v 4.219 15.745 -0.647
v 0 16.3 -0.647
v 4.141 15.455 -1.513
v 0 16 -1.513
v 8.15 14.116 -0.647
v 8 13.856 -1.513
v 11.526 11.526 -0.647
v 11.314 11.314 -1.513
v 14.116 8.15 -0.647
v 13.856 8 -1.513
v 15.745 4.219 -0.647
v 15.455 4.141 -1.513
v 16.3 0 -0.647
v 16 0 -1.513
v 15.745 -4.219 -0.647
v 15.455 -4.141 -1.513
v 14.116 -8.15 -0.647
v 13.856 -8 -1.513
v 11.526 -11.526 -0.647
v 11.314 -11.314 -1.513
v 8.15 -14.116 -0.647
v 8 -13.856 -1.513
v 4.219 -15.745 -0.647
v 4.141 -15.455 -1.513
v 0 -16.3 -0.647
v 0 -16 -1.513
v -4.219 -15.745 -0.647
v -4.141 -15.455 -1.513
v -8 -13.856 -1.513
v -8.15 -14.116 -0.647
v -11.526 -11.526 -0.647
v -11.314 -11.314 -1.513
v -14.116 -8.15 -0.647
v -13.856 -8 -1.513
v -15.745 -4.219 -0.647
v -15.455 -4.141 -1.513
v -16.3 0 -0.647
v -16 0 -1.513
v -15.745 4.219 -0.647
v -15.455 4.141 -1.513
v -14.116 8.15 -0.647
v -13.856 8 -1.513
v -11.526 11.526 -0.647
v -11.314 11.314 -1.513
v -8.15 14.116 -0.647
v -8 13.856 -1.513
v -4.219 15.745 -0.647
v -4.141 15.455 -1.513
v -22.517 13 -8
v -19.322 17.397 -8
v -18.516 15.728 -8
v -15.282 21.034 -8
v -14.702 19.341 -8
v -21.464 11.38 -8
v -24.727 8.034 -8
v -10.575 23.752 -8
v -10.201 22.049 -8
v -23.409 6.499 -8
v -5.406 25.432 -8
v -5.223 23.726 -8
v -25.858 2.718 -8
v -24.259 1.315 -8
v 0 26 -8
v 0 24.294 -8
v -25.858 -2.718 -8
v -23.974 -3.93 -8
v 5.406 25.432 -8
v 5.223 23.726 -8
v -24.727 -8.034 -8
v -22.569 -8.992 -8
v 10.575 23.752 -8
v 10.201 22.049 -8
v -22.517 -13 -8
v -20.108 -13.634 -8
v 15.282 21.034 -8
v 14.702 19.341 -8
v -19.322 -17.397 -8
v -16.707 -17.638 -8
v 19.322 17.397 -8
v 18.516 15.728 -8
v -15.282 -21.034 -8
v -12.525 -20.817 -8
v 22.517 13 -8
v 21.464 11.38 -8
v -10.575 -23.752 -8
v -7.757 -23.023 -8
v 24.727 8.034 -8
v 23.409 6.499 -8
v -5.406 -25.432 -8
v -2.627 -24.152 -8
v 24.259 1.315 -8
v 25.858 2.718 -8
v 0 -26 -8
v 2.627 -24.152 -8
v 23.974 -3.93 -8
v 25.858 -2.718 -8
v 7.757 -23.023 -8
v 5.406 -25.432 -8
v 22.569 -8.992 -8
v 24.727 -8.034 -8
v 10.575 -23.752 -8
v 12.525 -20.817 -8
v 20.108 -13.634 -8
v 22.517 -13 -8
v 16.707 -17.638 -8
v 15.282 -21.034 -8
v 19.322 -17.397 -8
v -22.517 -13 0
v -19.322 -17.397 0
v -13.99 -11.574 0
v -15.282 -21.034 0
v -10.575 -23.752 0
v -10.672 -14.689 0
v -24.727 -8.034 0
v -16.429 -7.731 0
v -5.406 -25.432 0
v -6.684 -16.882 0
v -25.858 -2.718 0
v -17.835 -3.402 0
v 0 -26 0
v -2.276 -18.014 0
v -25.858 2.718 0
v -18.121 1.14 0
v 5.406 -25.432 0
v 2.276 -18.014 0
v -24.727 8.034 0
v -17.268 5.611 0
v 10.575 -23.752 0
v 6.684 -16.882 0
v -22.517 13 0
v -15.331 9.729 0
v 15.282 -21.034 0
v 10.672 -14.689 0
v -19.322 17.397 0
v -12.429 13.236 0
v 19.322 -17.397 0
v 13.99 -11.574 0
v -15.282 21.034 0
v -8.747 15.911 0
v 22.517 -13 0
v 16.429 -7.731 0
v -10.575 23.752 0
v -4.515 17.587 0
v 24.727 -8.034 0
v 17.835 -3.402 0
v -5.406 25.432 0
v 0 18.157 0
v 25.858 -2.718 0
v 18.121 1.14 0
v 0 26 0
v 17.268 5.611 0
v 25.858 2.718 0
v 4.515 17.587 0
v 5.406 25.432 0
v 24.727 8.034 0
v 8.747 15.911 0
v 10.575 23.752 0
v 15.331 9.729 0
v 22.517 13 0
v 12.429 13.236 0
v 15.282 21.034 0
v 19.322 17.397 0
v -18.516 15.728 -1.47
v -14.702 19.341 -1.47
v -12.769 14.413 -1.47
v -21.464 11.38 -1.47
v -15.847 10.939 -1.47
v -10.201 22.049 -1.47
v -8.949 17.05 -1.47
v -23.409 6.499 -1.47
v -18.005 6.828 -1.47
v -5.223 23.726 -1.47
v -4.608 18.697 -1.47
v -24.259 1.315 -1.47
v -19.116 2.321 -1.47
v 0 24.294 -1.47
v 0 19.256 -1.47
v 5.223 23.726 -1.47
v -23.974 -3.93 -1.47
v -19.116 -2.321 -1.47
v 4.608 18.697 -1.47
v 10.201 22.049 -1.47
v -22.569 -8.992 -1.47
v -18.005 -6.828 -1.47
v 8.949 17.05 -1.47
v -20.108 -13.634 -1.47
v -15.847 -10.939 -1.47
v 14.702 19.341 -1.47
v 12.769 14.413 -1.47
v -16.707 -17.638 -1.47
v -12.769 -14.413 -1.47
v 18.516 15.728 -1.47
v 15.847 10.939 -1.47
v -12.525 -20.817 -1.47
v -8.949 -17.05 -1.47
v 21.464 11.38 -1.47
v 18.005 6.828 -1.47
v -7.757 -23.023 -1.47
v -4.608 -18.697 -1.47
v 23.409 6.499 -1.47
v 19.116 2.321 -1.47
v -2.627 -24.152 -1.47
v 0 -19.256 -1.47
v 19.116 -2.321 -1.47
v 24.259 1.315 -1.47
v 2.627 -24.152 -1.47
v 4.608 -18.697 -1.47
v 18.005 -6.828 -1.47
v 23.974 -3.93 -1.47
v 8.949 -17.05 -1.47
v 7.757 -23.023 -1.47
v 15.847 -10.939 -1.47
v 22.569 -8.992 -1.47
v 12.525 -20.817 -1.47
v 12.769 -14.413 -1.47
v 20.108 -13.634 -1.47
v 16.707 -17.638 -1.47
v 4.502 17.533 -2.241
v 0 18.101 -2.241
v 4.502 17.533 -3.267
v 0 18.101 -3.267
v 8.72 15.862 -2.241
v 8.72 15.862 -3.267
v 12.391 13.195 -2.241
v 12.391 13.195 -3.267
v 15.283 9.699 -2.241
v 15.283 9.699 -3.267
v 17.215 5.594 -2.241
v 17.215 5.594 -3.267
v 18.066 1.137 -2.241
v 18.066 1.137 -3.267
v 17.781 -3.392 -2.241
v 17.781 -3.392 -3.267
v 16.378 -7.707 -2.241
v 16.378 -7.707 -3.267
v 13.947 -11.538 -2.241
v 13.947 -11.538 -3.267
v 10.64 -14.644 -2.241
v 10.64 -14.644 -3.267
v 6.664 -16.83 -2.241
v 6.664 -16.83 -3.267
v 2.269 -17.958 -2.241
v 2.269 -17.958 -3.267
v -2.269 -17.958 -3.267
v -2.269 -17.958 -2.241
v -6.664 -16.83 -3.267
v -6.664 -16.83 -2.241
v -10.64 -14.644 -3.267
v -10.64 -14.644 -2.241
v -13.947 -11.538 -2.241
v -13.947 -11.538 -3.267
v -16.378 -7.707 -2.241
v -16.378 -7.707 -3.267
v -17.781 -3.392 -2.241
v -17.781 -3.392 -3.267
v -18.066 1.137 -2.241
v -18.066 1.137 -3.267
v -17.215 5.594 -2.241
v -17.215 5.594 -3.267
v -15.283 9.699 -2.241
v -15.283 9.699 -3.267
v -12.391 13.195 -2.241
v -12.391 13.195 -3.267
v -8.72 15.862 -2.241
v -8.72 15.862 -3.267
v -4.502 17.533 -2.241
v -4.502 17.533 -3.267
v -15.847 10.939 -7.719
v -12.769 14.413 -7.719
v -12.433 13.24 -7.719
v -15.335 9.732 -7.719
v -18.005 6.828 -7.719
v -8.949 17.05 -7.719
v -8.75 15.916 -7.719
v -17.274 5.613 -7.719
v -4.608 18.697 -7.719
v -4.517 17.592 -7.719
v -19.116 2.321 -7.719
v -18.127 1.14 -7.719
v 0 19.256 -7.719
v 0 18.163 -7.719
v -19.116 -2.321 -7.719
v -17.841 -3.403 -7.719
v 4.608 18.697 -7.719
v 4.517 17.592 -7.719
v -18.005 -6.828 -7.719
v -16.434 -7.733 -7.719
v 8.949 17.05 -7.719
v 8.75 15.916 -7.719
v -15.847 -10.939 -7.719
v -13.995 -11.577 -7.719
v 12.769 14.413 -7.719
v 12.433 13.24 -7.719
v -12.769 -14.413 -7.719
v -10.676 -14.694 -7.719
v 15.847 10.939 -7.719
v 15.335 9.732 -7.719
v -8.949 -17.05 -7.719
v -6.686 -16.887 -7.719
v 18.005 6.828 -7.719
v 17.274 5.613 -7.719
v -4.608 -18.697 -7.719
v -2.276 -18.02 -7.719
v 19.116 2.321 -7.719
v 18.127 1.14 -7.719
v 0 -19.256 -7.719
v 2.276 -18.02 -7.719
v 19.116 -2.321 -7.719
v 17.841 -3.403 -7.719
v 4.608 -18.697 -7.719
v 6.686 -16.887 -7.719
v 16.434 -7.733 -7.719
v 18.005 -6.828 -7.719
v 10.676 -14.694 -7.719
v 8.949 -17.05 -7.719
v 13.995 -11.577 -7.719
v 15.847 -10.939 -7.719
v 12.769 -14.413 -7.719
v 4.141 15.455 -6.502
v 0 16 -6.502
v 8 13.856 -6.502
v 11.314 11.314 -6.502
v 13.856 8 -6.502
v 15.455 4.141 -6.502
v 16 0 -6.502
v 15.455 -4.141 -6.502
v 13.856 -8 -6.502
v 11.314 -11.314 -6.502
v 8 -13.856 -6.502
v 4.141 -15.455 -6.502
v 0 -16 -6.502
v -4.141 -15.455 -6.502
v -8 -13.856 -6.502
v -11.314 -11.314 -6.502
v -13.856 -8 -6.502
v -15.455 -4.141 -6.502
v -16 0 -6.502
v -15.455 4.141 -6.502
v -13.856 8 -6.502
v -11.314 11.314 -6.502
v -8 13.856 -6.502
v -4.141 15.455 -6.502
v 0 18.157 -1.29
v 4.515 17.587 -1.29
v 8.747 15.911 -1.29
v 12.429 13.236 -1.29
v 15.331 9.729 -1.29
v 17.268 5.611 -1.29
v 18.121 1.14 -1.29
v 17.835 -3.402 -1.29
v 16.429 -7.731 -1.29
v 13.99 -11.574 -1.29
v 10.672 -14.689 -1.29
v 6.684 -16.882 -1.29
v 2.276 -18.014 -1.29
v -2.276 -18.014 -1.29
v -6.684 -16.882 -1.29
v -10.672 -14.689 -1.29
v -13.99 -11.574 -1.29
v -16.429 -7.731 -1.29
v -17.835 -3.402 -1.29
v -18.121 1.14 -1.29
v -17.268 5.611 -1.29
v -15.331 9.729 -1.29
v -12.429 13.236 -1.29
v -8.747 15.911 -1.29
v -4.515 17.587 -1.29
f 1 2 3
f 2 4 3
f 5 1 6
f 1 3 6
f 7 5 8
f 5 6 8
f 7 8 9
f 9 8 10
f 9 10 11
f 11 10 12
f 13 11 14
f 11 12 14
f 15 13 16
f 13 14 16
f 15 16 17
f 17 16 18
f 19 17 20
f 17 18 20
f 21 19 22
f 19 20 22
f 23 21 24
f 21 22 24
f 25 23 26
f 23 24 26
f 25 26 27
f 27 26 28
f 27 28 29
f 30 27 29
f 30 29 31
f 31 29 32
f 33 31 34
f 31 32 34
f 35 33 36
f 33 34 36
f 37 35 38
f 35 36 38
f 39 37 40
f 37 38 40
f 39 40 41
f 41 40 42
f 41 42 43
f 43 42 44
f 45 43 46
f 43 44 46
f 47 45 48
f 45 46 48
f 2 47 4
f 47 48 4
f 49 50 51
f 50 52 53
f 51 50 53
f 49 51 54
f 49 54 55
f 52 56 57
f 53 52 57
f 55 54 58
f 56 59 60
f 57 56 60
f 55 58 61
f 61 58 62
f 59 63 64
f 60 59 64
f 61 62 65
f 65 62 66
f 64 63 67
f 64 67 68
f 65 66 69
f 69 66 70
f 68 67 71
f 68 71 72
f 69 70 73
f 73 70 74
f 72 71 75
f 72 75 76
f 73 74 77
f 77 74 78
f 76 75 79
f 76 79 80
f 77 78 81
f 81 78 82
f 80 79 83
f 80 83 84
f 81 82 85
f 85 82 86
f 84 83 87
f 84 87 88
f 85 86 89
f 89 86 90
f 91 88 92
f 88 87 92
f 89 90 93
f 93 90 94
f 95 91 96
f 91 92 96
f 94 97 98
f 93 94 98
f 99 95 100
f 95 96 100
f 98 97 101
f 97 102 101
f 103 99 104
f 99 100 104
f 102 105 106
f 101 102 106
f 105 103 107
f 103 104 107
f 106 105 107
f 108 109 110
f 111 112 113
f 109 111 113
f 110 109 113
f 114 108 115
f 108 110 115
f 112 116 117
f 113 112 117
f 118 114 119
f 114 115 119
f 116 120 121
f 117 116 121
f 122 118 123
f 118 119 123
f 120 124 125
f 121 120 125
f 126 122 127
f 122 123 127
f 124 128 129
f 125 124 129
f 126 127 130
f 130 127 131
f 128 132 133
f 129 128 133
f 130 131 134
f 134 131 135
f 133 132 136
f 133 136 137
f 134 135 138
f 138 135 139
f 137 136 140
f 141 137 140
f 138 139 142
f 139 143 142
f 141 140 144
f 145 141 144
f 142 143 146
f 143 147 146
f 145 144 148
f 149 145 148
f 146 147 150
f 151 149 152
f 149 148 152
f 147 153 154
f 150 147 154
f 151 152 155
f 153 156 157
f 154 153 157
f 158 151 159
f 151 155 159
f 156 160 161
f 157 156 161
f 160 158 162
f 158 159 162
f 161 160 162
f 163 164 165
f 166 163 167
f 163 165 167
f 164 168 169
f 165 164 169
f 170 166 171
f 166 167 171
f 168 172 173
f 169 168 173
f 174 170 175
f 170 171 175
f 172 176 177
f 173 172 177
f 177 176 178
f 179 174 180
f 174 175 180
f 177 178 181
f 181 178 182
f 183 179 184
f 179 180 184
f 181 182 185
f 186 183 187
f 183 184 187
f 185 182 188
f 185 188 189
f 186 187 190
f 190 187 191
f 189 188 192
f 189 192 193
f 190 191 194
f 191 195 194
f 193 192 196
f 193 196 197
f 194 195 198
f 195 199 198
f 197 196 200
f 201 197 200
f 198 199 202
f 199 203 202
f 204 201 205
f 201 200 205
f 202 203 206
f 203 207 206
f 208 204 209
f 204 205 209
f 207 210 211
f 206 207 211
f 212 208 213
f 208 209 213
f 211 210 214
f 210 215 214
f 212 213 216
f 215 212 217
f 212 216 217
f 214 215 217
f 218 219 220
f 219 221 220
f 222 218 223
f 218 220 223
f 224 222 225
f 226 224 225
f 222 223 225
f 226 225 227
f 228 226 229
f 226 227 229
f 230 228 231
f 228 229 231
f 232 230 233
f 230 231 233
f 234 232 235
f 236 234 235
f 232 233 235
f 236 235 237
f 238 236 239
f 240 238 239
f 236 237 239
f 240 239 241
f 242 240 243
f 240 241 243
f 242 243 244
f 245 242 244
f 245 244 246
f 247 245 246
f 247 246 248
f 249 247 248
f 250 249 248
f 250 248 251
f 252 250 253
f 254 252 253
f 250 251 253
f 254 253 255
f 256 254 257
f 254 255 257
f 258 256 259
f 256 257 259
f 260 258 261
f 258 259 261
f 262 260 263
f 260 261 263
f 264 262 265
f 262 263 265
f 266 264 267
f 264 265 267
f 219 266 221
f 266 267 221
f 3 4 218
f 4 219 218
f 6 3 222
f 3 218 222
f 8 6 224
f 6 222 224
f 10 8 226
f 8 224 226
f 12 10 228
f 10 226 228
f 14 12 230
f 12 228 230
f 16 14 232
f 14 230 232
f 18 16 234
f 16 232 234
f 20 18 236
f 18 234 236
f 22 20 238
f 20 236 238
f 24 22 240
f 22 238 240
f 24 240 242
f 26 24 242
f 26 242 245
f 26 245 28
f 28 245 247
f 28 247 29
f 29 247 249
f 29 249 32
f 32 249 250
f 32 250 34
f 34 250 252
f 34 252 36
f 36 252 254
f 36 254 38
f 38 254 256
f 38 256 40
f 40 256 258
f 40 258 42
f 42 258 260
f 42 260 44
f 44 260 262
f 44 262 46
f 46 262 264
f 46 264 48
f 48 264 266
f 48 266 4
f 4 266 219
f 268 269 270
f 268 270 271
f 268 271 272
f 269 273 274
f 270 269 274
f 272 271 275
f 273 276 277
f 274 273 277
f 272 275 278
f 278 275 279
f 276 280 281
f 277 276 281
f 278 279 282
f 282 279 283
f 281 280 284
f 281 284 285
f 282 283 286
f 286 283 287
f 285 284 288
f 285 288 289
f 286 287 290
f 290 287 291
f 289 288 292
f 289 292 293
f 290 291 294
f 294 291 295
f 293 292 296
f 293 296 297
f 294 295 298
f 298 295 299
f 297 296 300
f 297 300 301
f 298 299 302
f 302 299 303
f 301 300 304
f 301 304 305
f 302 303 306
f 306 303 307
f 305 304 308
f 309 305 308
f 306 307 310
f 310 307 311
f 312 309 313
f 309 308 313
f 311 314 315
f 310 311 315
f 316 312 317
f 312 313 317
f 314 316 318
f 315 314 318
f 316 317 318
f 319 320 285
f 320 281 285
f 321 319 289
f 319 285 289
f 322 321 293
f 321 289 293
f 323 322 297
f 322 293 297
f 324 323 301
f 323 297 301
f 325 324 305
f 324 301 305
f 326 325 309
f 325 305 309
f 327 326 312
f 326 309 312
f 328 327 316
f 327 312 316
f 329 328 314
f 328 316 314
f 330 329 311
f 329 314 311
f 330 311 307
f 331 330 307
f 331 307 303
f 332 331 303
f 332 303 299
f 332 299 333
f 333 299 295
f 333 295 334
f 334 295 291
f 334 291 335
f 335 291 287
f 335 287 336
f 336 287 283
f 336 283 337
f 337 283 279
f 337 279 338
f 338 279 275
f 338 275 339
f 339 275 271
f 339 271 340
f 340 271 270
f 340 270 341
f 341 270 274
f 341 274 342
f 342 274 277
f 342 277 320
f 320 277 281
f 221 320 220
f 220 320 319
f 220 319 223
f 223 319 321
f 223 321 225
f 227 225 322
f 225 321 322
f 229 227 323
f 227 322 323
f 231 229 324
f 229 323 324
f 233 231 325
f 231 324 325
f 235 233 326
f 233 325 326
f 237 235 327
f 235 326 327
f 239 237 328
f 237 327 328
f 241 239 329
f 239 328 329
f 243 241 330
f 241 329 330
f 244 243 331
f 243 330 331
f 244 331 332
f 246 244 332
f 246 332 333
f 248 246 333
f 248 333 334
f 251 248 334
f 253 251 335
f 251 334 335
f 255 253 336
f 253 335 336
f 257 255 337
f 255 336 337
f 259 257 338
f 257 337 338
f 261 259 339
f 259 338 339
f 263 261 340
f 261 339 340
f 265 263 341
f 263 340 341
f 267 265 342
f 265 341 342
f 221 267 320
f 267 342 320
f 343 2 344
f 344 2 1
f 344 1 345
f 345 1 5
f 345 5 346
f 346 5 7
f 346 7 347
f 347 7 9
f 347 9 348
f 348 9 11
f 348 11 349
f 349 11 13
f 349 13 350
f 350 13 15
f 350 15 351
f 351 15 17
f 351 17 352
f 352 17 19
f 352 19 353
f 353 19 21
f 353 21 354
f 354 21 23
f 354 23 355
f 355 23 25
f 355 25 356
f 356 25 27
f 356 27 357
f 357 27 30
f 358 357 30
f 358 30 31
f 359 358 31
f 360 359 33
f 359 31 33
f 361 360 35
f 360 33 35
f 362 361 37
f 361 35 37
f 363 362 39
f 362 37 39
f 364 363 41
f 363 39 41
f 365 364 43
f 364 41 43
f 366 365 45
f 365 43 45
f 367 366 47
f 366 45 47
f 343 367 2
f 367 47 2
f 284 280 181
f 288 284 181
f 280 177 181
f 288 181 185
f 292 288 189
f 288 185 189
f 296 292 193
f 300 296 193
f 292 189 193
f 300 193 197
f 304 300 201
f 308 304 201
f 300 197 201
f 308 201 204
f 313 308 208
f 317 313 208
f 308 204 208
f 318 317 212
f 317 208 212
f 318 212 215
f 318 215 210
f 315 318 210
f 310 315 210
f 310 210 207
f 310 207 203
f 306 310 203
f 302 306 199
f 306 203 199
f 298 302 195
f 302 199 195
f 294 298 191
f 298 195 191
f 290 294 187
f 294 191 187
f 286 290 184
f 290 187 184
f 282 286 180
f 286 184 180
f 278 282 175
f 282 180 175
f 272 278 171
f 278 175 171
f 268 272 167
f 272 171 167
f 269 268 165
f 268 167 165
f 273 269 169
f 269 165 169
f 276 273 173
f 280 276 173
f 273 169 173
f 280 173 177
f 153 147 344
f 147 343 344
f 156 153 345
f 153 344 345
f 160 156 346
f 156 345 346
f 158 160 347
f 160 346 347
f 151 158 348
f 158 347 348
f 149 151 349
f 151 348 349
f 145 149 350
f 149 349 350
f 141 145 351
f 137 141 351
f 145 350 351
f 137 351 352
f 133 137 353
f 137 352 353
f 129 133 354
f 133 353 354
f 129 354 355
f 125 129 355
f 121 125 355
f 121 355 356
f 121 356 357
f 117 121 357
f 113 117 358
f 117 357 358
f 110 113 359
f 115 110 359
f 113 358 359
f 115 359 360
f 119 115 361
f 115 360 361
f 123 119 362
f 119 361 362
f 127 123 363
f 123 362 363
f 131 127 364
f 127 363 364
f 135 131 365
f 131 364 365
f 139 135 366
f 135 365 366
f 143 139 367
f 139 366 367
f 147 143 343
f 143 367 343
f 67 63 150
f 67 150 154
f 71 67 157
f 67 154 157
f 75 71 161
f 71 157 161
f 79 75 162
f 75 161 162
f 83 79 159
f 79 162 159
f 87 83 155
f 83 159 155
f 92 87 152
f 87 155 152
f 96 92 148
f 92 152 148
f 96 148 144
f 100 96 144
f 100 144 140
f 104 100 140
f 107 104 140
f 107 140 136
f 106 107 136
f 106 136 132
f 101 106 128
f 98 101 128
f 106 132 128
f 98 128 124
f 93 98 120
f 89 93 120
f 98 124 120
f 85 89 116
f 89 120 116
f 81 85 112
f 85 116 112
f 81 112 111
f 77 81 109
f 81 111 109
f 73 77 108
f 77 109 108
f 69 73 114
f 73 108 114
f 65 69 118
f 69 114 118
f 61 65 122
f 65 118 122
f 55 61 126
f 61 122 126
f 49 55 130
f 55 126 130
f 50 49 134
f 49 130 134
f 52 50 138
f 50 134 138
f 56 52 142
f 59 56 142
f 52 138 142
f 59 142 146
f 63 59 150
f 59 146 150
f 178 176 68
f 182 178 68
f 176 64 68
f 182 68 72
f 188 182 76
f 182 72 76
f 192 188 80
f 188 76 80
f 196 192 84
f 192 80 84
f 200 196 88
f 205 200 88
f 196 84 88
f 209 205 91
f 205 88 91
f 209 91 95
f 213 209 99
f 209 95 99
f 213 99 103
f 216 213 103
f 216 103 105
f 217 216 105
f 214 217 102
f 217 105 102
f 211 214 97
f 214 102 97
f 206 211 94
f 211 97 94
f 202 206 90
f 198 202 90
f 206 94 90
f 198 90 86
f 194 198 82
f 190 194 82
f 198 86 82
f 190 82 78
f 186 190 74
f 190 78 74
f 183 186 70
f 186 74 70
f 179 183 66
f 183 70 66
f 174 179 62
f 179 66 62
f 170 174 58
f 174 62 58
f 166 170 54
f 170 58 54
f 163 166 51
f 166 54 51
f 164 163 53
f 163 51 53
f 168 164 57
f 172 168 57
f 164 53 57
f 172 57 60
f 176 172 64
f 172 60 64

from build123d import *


with BuildPart() as part:
    # Sketch1 → Revolve1 (revolve)
    with BuildSketch(Plane(origin=(0, 0, 0), x_dir=(0, 0, -1), z_dir=(1, 0, 0))):
        Polygon((8, 26), (0, 26), (0, 18.157077096), (1.289905359, 18.157077096), (0.646560904, 16.300067014), (1.512702621, 16), (2.240654576, 18.101229145), (3.267168994, 18.101229145), (6.501757282, 16), (7.719119992, 18.162900408), (7.719119992, 19.256131168), (1.470175501, 19.256131168), (1.470175501, 24.294482866), (8, 24.294482866), align=None)
    revolve(axis=Axis((0, 0, 0), (0, 0, -1)))


solid = part.part
